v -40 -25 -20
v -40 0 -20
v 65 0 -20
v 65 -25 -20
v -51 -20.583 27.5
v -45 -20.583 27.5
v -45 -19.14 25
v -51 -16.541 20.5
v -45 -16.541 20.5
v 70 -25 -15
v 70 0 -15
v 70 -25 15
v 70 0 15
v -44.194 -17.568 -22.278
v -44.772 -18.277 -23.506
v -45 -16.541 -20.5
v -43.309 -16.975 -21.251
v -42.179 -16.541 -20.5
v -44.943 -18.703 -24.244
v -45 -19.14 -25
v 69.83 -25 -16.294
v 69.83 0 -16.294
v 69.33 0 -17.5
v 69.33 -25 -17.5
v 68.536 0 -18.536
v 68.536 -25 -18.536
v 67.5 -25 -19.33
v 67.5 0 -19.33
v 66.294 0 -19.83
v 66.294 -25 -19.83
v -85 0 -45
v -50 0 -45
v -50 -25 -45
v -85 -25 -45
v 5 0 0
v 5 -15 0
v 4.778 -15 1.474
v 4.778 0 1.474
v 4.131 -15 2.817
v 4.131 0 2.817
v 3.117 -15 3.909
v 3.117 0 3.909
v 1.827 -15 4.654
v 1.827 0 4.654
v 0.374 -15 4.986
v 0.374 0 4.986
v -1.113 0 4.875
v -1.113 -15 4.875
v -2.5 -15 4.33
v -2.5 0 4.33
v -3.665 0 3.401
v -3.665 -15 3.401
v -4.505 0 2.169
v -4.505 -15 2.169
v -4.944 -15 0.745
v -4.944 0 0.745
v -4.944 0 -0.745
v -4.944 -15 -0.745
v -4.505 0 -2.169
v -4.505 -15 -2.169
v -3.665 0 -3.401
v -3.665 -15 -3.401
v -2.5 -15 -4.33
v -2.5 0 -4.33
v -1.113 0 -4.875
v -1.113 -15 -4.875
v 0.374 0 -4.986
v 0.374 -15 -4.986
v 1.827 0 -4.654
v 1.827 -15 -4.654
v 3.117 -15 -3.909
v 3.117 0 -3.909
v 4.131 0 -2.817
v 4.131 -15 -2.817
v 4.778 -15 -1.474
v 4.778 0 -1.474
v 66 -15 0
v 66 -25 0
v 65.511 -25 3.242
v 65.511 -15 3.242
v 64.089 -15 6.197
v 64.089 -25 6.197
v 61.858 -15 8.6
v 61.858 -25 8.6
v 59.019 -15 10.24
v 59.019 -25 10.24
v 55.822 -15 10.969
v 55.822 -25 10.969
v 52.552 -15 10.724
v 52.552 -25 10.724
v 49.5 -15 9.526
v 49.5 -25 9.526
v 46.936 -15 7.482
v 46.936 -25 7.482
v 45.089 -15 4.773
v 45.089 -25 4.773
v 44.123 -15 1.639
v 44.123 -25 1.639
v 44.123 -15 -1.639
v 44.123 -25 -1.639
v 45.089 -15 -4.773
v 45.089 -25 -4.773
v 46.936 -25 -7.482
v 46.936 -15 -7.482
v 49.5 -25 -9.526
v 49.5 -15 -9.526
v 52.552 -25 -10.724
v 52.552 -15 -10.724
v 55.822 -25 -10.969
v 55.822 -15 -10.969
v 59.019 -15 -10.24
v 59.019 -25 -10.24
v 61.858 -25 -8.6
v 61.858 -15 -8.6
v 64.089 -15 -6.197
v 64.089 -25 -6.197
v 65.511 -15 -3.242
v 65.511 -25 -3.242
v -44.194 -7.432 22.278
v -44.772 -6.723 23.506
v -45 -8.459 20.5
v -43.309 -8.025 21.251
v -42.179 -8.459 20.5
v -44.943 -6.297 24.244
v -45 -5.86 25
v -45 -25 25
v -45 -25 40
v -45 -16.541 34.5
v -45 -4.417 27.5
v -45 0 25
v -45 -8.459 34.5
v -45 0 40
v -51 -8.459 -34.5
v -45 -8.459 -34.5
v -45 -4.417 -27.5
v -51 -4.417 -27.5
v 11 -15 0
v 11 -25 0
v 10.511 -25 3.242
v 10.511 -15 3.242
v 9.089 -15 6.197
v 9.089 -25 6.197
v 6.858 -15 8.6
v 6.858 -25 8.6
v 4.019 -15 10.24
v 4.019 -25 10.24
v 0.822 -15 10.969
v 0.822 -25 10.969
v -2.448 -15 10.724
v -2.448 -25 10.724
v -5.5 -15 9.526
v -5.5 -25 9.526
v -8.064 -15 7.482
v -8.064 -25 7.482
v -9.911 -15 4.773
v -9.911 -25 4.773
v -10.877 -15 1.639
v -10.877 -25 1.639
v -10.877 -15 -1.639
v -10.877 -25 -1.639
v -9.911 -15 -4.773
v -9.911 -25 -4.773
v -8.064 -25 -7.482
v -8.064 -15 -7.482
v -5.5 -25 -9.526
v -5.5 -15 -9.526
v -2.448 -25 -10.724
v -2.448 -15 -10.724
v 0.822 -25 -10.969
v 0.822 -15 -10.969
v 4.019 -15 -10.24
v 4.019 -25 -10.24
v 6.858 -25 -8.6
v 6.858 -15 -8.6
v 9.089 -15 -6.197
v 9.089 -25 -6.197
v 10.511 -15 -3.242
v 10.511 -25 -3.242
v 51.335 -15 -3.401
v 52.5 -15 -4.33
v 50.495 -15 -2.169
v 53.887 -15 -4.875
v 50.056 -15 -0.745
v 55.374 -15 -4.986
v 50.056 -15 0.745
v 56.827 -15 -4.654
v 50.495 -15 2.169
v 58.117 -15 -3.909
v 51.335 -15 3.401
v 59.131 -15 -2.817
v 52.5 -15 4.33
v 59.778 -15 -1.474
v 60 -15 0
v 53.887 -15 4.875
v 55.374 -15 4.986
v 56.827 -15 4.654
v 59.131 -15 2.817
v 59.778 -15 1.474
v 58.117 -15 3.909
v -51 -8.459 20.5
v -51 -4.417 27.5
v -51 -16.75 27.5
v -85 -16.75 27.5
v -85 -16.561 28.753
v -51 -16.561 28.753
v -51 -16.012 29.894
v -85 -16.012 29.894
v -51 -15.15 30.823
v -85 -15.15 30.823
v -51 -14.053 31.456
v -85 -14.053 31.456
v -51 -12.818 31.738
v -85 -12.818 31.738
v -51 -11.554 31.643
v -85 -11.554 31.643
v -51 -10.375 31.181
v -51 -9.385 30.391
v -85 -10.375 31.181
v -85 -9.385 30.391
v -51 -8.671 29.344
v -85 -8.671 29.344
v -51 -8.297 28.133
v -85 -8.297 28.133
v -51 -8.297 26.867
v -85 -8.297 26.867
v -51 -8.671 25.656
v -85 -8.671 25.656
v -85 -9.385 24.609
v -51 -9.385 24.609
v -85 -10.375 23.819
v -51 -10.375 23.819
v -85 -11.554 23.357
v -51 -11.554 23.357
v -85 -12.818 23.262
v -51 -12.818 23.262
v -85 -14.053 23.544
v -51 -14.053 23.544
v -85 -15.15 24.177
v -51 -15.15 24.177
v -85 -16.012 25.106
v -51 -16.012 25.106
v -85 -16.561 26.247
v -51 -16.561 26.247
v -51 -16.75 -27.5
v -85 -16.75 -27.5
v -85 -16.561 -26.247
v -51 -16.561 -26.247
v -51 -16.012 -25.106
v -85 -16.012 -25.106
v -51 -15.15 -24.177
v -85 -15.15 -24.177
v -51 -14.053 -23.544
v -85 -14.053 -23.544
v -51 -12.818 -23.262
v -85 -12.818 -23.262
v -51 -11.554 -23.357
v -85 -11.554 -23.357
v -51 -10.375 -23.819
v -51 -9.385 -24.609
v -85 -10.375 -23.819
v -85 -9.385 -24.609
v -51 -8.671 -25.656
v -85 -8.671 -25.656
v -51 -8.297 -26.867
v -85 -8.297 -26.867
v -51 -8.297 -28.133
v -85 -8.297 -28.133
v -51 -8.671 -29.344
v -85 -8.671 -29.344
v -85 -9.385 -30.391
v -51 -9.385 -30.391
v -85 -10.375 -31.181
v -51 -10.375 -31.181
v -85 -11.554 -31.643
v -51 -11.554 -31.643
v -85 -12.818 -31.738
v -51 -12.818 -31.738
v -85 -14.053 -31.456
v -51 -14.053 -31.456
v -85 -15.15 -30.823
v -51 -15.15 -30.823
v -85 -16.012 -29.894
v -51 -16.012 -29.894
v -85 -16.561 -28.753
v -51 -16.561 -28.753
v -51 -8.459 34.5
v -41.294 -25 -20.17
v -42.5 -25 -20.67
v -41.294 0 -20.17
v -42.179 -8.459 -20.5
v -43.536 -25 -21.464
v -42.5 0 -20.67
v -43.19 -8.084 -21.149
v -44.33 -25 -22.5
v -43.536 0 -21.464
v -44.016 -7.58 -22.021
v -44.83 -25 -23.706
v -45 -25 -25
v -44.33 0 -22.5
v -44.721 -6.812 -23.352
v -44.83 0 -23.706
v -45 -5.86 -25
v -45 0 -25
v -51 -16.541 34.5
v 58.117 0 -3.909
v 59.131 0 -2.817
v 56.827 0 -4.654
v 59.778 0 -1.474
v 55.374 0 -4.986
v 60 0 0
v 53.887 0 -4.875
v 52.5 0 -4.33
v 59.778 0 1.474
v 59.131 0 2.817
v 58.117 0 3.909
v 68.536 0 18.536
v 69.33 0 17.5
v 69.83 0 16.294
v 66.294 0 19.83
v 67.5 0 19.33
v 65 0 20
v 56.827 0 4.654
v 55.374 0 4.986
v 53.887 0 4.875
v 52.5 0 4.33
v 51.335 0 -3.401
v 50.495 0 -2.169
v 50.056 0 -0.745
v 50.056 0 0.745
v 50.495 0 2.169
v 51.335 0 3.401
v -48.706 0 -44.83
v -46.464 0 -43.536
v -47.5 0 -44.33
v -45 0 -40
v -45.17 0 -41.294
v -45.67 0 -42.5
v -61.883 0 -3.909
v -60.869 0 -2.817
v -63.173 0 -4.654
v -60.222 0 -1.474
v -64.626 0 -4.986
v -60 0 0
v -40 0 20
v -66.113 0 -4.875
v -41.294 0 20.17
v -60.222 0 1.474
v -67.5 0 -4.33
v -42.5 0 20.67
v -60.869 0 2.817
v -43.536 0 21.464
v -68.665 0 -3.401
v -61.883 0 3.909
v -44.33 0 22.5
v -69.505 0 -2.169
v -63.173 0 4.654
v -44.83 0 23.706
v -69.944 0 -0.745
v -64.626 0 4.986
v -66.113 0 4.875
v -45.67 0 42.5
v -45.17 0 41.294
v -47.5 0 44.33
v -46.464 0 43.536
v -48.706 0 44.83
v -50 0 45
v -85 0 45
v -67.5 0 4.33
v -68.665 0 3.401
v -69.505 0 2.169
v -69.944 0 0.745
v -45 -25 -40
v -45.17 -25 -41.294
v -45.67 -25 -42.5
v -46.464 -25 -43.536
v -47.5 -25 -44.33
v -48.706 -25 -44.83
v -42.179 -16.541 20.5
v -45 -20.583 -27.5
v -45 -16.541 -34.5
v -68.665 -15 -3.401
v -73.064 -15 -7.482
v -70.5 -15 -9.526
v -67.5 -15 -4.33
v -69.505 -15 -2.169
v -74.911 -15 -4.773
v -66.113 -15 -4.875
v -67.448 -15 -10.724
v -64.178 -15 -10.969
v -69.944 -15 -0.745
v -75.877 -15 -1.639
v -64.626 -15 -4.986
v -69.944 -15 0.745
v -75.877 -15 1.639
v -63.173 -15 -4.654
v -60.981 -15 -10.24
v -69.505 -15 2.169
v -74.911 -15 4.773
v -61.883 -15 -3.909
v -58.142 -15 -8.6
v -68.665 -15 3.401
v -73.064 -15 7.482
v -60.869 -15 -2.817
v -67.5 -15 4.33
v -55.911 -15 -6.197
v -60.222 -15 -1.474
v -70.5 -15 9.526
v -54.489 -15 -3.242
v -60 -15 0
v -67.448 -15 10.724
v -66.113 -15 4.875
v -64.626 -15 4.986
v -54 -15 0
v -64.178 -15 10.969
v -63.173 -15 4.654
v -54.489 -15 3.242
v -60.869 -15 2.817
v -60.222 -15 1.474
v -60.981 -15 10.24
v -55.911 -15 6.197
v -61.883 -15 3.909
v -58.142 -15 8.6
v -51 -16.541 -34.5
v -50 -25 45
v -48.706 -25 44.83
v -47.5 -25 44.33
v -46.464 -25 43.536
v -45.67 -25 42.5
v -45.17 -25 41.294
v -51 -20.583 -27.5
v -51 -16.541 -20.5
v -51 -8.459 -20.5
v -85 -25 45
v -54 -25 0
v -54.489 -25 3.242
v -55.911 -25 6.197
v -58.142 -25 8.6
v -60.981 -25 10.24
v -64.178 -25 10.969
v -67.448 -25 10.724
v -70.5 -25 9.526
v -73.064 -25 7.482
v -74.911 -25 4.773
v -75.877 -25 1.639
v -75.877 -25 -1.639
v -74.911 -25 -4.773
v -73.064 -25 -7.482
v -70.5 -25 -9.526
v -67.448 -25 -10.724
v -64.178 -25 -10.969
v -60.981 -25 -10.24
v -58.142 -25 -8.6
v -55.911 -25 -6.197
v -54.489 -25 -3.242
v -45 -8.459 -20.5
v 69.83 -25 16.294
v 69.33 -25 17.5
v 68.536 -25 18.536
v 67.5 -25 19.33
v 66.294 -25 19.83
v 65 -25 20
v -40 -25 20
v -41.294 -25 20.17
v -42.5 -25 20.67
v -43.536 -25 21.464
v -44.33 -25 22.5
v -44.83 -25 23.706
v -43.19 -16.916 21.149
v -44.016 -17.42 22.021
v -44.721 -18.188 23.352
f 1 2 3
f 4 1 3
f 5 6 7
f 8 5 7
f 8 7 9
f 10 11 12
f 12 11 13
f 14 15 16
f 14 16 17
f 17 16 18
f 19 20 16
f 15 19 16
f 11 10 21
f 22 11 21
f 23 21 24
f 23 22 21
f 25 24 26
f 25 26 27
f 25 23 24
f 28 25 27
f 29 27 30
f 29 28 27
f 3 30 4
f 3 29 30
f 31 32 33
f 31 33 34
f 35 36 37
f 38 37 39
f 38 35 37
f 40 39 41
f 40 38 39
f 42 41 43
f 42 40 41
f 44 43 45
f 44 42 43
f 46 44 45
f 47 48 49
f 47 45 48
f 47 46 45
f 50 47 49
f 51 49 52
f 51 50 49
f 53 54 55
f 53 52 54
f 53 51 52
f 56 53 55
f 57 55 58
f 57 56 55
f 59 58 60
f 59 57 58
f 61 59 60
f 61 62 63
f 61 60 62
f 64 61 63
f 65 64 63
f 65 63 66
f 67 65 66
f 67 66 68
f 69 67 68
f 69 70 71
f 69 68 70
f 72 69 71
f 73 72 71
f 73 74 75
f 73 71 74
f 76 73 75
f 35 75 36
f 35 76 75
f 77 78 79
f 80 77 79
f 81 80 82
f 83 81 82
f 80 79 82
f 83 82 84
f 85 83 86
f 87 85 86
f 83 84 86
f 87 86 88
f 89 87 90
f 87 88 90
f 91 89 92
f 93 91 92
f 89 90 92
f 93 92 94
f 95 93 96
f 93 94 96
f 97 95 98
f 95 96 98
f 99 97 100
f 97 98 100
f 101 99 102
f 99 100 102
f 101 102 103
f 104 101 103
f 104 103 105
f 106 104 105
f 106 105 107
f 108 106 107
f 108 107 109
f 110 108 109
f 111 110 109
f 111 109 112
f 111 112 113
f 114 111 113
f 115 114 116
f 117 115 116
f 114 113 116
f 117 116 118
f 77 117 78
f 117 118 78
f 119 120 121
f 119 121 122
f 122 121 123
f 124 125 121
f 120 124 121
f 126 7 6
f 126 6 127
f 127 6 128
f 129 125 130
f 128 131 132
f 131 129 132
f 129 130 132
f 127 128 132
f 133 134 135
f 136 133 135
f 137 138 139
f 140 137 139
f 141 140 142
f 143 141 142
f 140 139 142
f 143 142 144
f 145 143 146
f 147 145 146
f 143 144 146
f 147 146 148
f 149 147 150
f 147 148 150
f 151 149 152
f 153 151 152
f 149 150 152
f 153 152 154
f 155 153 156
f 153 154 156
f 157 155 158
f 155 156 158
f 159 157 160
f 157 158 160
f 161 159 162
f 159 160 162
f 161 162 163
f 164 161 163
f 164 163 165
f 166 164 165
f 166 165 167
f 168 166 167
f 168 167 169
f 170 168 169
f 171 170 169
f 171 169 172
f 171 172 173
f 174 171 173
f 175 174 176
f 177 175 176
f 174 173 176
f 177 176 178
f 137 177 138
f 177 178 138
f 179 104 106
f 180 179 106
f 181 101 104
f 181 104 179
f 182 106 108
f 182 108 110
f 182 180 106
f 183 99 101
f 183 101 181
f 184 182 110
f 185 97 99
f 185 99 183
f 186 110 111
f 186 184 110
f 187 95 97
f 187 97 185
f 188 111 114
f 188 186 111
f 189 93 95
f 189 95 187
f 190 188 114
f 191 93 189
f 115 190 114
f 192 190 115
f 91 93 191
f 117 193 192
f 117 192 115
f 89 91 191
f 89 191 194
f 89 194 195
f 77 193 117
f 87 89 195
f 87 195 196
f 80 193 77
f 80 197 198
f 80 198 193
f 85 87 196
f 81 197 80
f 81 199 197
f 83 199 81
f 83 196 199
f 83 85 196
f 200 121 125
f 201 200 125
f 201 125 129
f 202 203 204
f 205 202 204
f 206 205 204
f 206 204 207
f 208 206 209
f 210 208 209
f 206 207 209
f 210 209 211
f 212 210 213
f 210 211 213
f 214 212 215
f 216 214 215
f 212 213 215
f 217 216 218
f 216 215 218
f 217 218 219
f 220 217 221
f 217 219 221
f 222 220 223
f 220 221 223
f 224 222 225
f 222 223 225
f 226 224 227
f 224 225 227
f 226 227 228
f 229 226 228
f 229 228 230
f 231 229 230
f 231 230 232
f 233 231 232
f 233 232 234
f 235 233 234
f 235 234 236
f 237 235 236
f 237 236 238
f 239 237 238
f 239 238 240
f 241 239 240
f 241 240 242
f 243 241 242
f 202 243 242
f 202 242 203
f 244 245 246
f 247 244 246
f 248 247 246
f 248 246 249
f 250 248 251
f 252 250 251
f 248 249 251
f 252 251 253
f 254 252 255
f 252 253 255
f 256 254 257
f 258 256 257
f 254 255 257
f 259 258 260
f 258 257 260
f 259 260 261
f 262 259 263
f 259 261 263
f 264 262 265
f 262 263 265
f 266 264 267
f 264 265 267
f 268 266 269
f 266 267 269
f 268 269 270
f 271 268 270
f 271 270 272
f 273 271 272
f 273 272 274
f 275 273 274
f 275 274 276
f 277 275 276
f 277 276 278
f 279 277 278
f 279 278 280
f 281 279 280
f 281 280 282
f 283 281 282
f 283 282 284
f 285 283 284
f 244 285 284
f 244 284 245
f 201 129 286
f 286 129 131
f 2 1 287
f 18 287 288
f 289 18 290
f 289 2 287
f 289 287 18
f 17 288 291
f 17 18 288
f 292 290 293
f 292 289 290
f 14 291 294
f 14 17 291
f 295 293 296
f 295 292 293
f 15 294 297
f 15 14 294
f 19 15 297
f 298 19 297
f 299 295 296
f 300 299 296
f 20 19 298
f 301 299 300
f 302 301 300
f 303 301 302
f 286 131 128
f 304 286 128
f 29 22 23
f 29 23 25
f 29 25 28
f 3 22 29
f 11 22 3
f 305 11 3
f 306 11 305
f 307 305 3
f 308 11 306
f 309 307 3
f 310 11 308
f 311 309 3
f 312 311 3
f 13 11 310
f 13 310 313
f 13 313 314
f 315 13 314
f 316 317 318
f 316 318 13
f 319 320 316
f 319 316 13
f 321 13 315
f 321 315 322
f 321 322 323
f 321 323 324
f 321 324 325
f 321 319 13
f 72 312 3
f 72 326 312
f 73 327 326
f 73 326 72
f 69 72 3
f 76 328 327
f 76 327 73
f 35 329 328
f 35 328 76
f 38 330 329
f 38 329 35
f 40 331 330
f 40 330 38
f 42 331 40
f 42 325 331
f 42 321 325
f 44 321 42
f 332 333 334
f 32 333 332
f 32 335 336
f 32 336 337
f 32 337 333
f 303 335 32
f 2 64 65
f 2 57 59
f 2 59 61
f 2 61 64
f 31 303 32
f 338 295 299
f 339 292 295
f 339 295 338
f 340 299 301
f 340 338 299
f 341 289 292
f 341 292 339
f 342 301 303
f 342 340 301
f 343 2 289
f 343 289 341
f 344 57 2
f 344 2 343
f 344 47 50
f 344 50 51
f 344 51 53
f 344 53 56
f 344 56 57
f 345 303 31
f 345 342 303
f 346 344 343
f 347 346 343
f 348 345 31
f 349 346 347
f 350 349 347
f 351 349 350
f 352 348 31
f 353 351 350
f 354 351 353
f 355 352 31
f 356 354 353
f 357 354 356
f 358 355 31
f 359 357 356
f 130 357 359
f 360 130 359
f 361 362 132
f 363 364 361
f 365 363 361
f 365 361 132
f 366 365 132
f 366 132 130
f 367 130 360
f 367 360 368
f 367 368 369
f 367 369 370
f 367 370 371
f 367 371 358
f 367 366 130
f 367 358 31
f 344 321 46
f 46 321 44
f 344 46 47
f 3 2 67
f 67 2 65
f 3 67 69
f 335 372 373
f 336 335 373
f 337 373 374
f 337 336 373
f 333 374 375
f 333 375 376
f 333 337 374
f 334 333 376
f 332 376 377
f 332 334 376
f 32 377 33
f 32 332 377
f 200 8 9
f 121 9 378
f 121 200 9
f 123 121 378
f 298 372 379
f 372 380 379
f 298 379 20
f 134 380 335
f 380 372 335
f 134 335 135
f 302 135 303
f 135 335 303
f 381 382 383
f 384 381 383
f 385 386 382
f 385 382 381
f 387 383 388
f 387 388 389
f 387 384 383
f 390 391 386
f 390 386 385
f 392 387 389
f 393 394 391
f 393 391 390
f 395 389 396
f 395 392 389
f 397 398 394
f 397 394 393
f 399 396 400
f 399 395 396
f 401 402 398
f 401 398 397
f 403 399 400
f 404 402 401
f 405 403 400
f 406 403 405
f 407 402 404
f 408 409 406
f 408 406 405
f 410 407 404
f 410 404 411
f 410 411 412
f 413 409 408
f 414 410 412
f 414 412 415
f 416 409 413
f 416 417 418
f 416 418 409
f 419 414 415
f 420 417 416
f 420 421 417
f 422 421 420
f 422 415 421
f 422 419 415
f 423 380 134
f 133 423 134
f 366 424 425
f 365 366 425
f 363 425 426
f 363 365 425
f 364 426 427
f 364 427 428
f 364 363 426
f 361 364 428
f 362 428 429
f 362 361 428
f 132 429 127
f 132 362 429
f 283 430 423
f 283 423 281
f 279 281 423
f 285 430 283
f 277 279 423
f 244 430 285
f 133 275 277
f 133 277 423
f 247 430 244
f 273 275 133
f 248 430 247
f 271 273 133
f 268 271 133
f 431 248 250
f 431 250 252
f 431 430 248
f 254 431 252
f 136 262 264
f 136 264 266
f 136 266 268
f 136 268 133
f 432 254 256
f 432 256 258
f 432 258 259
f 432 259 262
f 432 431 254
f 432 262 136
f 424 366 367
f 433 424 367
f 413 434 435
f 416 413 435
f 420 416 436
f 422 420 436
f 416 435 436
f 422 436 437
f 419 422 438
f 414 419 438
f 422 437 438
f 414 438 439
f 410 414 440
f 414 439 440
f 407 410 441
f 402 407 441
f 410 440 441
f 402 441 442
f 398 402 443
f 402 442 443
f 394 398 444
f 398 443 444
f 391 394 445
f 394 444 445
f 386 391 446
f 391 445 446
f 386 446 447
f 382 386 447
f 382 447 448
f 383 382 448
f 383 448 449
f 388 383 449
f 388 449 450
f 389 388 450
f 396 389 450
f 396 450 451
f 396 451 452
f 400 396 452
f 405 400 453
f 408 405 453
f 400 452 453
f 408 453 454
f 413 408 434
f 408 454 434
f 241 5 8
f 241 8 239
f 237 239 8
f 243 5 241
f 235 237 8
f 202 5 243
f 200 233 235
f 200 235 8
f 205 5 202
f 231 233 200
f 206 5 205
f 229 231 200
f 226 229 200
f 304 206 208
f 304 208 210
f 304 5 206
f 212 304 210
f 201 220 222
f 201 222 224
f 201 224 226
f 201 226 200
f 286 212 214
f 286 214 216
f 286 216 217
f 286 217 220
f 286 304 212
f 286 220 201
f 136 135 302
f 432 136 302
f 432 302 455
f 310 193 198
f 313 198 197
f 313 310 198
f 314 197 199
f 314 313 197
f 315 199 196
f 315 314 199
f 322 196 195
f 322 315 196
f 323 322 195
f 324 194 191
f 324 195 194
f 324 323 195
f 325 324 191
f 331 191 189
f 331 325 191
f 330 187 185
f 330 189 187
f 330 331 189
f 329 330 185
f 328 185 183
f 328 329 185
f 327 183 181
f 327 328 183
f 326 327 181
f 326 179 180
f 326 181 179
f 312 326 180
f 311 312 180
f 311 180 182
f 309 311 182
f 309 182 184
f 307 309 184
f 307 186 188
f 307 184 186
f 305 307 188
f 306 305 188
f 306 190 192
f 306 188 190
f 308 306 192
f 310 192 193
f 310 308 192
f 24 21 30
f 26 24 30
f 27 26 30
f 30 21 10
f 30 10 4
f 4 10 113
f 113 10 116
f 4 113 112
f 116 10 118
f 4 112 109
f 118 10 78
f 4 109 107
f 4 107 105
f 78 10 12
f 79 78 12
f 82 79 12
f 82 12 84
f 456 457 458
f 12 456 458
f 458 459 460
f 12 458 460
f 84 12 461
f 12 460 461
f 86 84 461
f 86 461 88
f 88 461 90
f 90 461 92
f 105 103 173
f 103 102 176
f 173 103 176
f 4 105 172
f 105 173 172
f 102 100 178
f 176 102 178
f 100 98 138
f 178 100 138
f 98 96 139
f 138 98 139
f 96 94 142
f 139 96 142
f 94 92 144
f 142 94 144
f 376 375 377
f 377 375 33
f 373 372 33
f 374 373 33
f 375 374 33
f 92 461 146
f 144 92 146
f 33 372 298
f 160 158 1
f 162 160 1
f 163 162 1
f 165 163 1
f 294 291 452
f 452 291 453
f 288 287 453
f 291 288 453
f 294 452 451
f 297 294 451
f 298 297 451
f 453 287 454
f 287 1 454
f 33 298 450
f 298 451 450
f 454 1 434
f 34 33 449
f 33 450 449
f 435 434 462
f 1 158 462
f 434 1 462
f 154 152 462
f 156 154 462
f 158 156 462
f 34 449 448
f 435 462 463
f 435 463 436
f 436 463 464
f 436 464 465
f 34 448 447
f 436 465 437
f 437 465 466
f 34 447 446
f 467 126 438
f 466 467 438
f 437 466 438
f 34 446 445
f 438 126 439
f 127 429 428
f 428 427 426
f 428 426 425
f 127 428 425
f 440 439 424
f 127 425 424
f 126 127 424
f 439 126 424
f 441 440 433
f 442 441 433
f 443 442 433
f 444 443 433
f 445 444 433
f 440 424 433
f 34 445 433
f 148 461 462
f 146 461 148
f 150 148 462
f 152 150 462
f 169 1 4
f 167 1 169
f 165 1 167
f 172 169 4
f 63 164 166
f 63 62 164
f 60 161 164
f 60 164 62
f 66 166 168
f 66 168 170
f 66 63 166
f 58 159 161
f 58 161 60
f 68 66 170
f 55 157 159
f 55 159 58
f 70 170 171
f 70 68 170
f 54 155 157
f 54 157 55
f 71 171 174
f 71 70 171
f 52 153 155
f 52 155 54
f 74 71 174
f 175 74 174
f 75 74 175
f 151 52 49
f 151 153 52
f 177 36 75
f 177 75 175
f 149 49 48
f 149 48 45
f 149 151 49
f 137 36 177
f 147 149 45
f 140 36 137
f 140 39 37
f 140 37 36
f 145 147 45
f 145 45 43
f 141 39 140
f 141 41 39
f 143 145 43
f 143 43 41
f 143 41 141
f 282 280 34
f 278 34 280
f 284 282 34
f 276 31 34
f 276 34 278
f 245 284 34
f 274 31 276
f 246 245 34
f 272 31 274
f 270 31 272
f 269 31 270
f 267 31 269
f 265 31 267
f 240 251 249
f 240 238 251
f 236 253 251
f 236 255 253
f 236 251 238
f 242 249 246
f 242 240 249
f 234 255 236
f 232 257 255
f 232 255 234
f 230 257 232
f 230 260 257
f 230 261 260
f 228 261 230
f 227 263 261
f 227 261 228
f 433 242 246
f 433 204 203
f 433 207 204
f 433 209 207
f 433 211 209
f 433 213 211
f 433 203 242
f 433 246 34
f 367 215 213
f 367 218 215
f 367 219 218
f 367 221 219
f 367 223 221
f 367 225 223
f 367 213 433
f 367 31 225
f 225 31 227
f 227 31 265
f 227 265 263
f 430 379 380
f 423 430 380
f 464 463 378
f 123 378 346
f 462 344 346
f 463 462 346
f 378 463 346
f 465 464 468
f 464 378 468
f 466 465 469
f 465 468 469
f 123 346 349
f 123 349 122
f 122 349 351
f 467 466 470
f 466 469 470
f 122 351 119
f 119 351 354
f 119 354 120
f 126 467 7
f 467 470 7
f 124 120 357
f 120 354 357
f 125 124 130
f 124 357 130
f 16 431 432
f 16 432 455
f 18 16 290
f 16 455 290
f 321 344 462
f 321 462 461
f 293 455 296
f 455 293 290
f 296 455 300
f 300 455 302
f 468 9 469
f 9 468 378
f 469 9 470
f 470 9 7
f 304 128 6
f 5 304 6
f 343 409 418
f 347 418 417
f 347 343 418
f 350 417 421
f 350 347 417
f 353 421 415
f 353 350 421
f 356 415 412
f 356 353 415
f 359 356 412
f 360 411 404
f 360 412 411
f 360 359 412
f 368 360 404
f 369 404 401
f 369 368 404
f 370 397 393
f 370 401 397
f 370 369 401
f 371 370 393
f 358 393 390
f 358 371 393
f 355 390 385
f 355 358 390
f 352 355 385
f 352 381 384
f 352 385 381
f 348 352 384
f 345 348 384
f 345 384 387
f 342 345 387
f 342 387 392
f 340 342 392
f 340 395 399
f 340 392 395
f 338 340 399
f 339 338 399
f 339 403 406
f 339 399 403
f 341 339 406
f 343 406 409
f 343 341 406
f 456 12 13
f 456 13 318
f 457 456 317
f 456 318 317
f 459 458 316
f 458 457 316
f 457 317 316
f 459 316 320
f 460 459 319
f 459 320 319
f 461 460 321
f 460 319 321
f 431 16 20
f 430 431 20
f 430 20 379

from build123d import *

# Parameters (mm, degrees)
F0_W          = 155
F0_H          = 40
F0_R          = 5
F1_DEPTH      = 25
F2_R          = 11
F3_DEPTH      = 10
F4_W          = 40
F4_H          = 25
F5_DEPTH      = 25
F6_R          = 4.25
F7_DEPTH      = 40
F9_DEPTH      = 6
F10_T4_DEPTH  = 25
F10_T10_DEPTH = 25
F10_T16_DEPTH = 25
F10_T23_DEPTH = 25
F10_T29_DEPTH = 25
F10_T35_DEPTH = 25
F10_T41_DEPTH = 25
F10_T47_DEPTH = 25
F10_T54_DEPTH = 25
F10_T60_DEPTH = 25
F10_T63_DEPTH = 50


# Not quite as in the source:
# - a fillet or chamfer that OpenCascade refuses, or shapes differently, is made with other operations: its cross-section is extruded or revolved along the edge and cut away or added


with BuildPart() as f1:
    # F0 (on Front) → F1 (new body)
    with BuildSketch(Plane.XZ):
        with Locations((-7.5, 0)):
            Rectangle(F0_W, F0_H)
        with Locations((-65, 0)):
            Circle(F0_R, mode=Mode.SUBTRACT)
        Circle(F0_R, mode=Mode.SUBTRACT)
        with Locations((55, 0)):
            Circle(F0_R, mode=Mode.SUBTRACT)
    extrude(amount=F1_DEPTH)

    # F2 (on face) → F3 (cut)
    with BuildSketch(Plane.XZ.offset(25)):
        with Locations((-65, 0)):
            Circle(F2_R)
        Circle(F2_R)
        with Locations((55, 0)):
            Circle(F2_R)
    extrude(amount=-F3_DEPTH, mode=Mode.SUBTRACT)

    # F4 (on face) → F5 (join)
    with BuildSketch(Plane(origin=(0, 0, 0), x_dir=(-1, 0, 0), z_dir=(0, 1, 0))):
        with Locations((65, 32.5)):
            Rectangle(F4_W, F4_H)
        with Locations((65, -32.5)):
            Rectangle(F4_W, F4_H)
    extrude(amount=-F5_DEPTH)

    # F6 (on face) → F7 (cut, through all)
    with BuildSketch(Plane(origin=(-85, 0, 0), x_dir=(0, -1, 0), z_dir=(-1, 0, 0))):
        with Locations((12.5, 27.5)):
            Circle(F6_R)
        with Locations((12.5, -27.5)):
            Circle(F6_R)
    extrude(amount=-F7_DEPTH, mode=Mode.SUBTRACT)

    # F8 (on face) → F9 (cut)
    with BuildSketch(Plane.YZ.offset(-45)):
        Polygon((-8.4585481157, 34.5), (-16.5414518843, 34.5), (-20.5829037687, 27.5), (-16.5414518843, 20.5), (-8.4585481157, 20.5), (-4.4170962313, 27.5), align=None)
        Polygon((-8.4585481157, -20.5), (-16.5414518843, -20.5), (-20.5829037687, -27.5), (-16.5414518843, -34.5), (-8.4585481157, -34.5), (-4.4170962313, -27.5), align=None)
    extrude(amount=-F9_DEPTH, mode=Mode.SUBTRACT)

    # F10: fillet of radius 5 on 6 edges, made by hand


with BuildPart() as f10_tool2:
    # F10_s3 → F10_t4 (new body)
    with BuildSketch(Plane.XZ):
        with BuildLine():
            ThreePointArc((-40, 20), (-43.5355339059, 21.4644660941), (-45, 25))
            Line((-45, 25), (-45, 20))
            Line((-45, 20), (-40, 20))
        make_face()
    extrude(amount=F10_T4_DEPTH)

    split(bisect_by=Plane.XY.offset(20.5), keep=Keep.BOTTOM)

    split(bisect_by=Plane(origin=(0, -15.2206714755, 8.7876587737), x_dir=(1, 0, 0), z_dir=(0, 0.8660254038, -0.5)), keep=Keep.TOP)


with BuildPart() as f1_1:
    add(f1.part)

    # F10_t1: union F10_tool2
    add(f10_tool2.part)


with BuildPart() as f10_tool8:
    # F10_s9 → F10_t10 (new body)
    with BuildSketch(Plane.XZ):
        with BuildLine():
            ThreePointArc((-40, 20), (-43.5355339059, 21.4644660941), (-45, 25))
            Line((-45, 25), (-45, 20))
            Line((-45, 20), (-40, 20))
        make_face()
    extrude(amount=F10_T10_DEPTH)

    split(bisect_by=Plane.XY.offset(20.5), keep=Keep.TOP)

    split(bisect_by=Plane(origin=(0, -15.2206714755, 8.7876587737), x_dir=(1, 0, 0), z_dir=(0, 0.8660254038, -0.5)), keep=Keep.TOP)


with BuildPart() as f1_2:
    add(f1_1.part)

    # F10_t7: union F10_tool8
    add(f10_tool8.part)


with BuildPart() as f10_tool14:
    # F10_s15 → F10_t16 (new body)
    with BuildSketch(Plane.XZ):
        with BuildLine():
            ThreePointArc((-40, 20), (-43.5355339059, 21.4644660941), (-45, 25))
            Line((-45, 25), (-45, 20))
            Line((-45, 20), (-40, 20))
        make_face()
    extrude(amount=F10_T16_DEPTH)

    split(bisect_by=Plane(origin=(0, -3.5293285245, -2.0376587737), x_dir=(1, 0, 0), z_dir=(0, 0.8660254038, 0.5)), keep=Keep.TOP)

    split(bisect_by=Plane.XY.offset(20.5), keep=Keep.BOTTOM)

    split(bisect_by=Plane(origin=(0, -15.2206714755, 8.7876587737), x_dir=(1, 0, 0), z_dir=(0, -0.8660254038, 0.5)), keep=Keep.TOP)


with BuildPart() as f1_3:
    add(f1_2.part)

    # F10_t13: union F10_tool14
    add(f10_tool14.part)


with BuildPart() as f10_tool21:
    # F10_s22 → F10_t23 (new body)
    with BuildSketch(Plane.XZ):
        with BuildLine():
            ThreePointArc((-40, 20), (-43.5355339059, 21.4644660941), (-45, 25))
            Line((-45, 25), (-45, 20))
            Line((-45, 20), (-40, 20))
        make_face()
    extrude(amount=F10_T23_DEPTH)

    split(bisect_by=Plane(origin=(0, -3.5293285245, -2.0376587737), x_dir=(1, 0, 0), z_dir=(0, -0.8660254038, -0.5)), keep=Keep.TOP)

    split(bisect_by=Plane.XY.offset(20.5), keep=Keep.BOTTOM)


with BuildPart() as f1_4:
    add(f1_3.part)

    # F10_t20: union F10_tool21
    add(f10_tool21.part)


with BuildPart() as f10_tool27:
    # F10_s28 → F10_t29 (new body)
    with BuildSketch(Plane.XZ):
        with BuildLine():
            ThreePointArc((-40, 20), (-43.5355339059, 21.4644660941), (-45, 25))
            Line((-45, 25), (-45, 20))
            Line((-45, 20), (-40, 20))
        make_face()
    extrude(amount=F10_T29_DEPTH)

    split(bisect_by=Plane(origin=(0, -3.5293285245, -2.0376587737), x_dir=(1, 0, 0), z_dir=(0, -0.8660254038, -0.5)), keep=Keep.TOP)

    split(bisect_by=Plane.XY.offset(20.5), keep=Keep.TOP)


with BuildPart() as f1_5:
    add(f1_4.part)

    # F10_t26: union F10_tool27
    add(f10_tool27.part)


with BuildPart() as f10_tool33:
    # F10_s34 → F10_t35 (new body)
    with BuildSketch(Plane.XZ):
        with BuildLine():
            ThreePointArc((-40, -20), (-43.5355339059, -21.4644660941), (-45, -25))
            Line((-45, -25), (-45, -20))
            Line((-45, -20), (-40, -20))
        make_face()
    extrude(amount=F10_T35_DEPTH)

    split(bisect_by=Plane.XY.offset(-20.5), keep=Keep.TOP)

    split(bisect_by=Plane(origin=(0, -15.2206714755, -8.7876587737), x_dir=(1, 0, 0), z_dir=(0, 0.8660254038, 0.5)), keep=Keep.TOP)


with BuildPart() as f1_6:
    add(f1_5.part)

    # F10_t32: union F10_tool33
    add(f10_tool33.part)


with BuildPart() as f10_tool39:
    # F10_s40 → F10_t41 (new body)
    with BuildSketch(Plane.XZ):
        with BuildLine():
            ThreePointArc((-40, -20), (-43.5355339059, -21.4644660941), (-45, -25))
            Line((-45, -25), (-45, -20))
            Line((-45, -20), (-40, -20))
        make_face()
    extrude(amount=F10_T41_DEPTH)

    split(bisect_by=Plane.XY.offset(-20.5), keep=Keep.BOTTOM)

    split(bisect_by=Plane(origin=(0, -15.2206714755, -8.7876587737), x_dir=(1, 0, 0), z_dir=(0, 0.8660254038, 0.5)), keep=Keep.TOP)


with BuildPart() as f1_7:
    add(f1_6.part)

    # F10_t38: union F10_tool39
    add(f10_tool39.part)


with BuildPart() as f10_tool45:
    # F10_s46 → F10_t47 (new body)
    with BuildSketch(Plane.XZ):
        with BuildLine():
            ThreePointArc((-40, -20), (-43.5355339059, -21.4644660941), (-45, -25))
            Line((-45, -25), (-45, -20))
            Line((-45, -20), (-40, -20))
        make_face()
    extrude(amount=F10_T47_DEPTH)

    split(bisect_by=Plane.XY.offset(-20.5), keep=Keep.TOP)

    split(bisect_by=Plane(origin=(0, -3.5293285245, 2.0376587737), x_dir=(1, 0, 0), z_dir=(0, 0.8660254038, -0.5)), keep=Keep.TOP)

    split(bisect_by=Plane(origin=(0, -15.2206714755, -8.7876587737), x_dir=(1, 0, 0), z_dir=(0, -0.8660254038, -0.5)), keep=Keep.TOP)


with BuildPart() as f1_8:
    add(f1_7.part)

    # F10_t44: union F10_tool45
    add(f10_tool45.part)


with BuildPart() as f10_tool52:
    # F10_s53 → F10_t54 (new body)
    with BuildSketch(Plane.XZ):
        with BuildLine():
            ThreePointArc((-40, -20), (-43.5355339059, -21.4644660941), (-45, -25))
            Line((-45, -25), (-45, -20))
            Line((-45, -20), (-40, -20))
        make_face()
    extrude(amount=F10_T54_DEPTH)

    split(bisect_by=Plane.XY.offset(-20.5), keep=Keep.TOP)

    split(bisect_by=Plane(origin=(0, -3.5293285245, 2.0376587737), x_dir=(1, 0, 0), z_dir=(0, -0.8660254038, 0.5)), keep=Keep.TOP)


with BuildPart() as f1_9:
    add(f1_8.part)

    # F10_t51: union F10_tool52
    add(f10_tool52.part)


with BuildPart() as f10_tool58:
    # F10_s59 → F10_t60 (new body)
    with BuildSketch(Plane.XZ):
        with BuildLine():
            ThreePointArc((-40, -20), (-43.5355339059, -21.4644660941), (-45, -25))
            Line((-45, -25), (-45, -20))
            Line((-45, -20), (-40, -20))
        make_face()
    extrude(amount=F10_T60_DEPTH)

    split(bisect_by=Plane.XY.offset(-20.5), keep=Keep.BOTTOM)

    split(bisect_by=Plane(origin=(0, -3.5293285245, 2.0376587737), x_dir=(1, 0, 0), z_dir=(0, -0.8660254038, 0.5)), keep=Keep.TOP)


with BuildPart() as f1_10:
    add(f1_9.part)

    # F10_t57: union F10_tool58
    add(f10_tool58.part)

    # F10_s64 → F10_t63 (cut)
    with BuildSketch(Plane.XZ.offset(-12.5)):
        with BuildLine():
            ThreePointArc((-50, 45), (-46.4644660941, 43.5355339059), (-45, 40))
            Line((-45, 40), (-45, 45))
            Line((-45, 45), (-50, 45))
        make_face()
        with BuildLine():
            ThreePointArc((-45, -40), (-46.4644660941, -43.5355339059), (-50, -45))
            Line((-50, -45), (-45, -45))
            Line((-45, -45), (-45, -40))
        make_face()
        with BuildLine():
            ThreePointArc((70, -15), (68.5355339059, -18.5355339059), (65, -20))
            Line((65, -20), (70, -20))
            Line((70, -20), (70, -15))
        make_face()
        with BuildLine():
            ThreePointArc((70, 15), (68.5355339059, 18.5355339059), (65, 20))
            Line((65, 20), (70, 20))
            Line((70, 20), (70, 15))
        make_face()
    extrude(amount=F10_T63_DEPTH, mode=Mode.SUBTRACT)


solid = f1_10.part
